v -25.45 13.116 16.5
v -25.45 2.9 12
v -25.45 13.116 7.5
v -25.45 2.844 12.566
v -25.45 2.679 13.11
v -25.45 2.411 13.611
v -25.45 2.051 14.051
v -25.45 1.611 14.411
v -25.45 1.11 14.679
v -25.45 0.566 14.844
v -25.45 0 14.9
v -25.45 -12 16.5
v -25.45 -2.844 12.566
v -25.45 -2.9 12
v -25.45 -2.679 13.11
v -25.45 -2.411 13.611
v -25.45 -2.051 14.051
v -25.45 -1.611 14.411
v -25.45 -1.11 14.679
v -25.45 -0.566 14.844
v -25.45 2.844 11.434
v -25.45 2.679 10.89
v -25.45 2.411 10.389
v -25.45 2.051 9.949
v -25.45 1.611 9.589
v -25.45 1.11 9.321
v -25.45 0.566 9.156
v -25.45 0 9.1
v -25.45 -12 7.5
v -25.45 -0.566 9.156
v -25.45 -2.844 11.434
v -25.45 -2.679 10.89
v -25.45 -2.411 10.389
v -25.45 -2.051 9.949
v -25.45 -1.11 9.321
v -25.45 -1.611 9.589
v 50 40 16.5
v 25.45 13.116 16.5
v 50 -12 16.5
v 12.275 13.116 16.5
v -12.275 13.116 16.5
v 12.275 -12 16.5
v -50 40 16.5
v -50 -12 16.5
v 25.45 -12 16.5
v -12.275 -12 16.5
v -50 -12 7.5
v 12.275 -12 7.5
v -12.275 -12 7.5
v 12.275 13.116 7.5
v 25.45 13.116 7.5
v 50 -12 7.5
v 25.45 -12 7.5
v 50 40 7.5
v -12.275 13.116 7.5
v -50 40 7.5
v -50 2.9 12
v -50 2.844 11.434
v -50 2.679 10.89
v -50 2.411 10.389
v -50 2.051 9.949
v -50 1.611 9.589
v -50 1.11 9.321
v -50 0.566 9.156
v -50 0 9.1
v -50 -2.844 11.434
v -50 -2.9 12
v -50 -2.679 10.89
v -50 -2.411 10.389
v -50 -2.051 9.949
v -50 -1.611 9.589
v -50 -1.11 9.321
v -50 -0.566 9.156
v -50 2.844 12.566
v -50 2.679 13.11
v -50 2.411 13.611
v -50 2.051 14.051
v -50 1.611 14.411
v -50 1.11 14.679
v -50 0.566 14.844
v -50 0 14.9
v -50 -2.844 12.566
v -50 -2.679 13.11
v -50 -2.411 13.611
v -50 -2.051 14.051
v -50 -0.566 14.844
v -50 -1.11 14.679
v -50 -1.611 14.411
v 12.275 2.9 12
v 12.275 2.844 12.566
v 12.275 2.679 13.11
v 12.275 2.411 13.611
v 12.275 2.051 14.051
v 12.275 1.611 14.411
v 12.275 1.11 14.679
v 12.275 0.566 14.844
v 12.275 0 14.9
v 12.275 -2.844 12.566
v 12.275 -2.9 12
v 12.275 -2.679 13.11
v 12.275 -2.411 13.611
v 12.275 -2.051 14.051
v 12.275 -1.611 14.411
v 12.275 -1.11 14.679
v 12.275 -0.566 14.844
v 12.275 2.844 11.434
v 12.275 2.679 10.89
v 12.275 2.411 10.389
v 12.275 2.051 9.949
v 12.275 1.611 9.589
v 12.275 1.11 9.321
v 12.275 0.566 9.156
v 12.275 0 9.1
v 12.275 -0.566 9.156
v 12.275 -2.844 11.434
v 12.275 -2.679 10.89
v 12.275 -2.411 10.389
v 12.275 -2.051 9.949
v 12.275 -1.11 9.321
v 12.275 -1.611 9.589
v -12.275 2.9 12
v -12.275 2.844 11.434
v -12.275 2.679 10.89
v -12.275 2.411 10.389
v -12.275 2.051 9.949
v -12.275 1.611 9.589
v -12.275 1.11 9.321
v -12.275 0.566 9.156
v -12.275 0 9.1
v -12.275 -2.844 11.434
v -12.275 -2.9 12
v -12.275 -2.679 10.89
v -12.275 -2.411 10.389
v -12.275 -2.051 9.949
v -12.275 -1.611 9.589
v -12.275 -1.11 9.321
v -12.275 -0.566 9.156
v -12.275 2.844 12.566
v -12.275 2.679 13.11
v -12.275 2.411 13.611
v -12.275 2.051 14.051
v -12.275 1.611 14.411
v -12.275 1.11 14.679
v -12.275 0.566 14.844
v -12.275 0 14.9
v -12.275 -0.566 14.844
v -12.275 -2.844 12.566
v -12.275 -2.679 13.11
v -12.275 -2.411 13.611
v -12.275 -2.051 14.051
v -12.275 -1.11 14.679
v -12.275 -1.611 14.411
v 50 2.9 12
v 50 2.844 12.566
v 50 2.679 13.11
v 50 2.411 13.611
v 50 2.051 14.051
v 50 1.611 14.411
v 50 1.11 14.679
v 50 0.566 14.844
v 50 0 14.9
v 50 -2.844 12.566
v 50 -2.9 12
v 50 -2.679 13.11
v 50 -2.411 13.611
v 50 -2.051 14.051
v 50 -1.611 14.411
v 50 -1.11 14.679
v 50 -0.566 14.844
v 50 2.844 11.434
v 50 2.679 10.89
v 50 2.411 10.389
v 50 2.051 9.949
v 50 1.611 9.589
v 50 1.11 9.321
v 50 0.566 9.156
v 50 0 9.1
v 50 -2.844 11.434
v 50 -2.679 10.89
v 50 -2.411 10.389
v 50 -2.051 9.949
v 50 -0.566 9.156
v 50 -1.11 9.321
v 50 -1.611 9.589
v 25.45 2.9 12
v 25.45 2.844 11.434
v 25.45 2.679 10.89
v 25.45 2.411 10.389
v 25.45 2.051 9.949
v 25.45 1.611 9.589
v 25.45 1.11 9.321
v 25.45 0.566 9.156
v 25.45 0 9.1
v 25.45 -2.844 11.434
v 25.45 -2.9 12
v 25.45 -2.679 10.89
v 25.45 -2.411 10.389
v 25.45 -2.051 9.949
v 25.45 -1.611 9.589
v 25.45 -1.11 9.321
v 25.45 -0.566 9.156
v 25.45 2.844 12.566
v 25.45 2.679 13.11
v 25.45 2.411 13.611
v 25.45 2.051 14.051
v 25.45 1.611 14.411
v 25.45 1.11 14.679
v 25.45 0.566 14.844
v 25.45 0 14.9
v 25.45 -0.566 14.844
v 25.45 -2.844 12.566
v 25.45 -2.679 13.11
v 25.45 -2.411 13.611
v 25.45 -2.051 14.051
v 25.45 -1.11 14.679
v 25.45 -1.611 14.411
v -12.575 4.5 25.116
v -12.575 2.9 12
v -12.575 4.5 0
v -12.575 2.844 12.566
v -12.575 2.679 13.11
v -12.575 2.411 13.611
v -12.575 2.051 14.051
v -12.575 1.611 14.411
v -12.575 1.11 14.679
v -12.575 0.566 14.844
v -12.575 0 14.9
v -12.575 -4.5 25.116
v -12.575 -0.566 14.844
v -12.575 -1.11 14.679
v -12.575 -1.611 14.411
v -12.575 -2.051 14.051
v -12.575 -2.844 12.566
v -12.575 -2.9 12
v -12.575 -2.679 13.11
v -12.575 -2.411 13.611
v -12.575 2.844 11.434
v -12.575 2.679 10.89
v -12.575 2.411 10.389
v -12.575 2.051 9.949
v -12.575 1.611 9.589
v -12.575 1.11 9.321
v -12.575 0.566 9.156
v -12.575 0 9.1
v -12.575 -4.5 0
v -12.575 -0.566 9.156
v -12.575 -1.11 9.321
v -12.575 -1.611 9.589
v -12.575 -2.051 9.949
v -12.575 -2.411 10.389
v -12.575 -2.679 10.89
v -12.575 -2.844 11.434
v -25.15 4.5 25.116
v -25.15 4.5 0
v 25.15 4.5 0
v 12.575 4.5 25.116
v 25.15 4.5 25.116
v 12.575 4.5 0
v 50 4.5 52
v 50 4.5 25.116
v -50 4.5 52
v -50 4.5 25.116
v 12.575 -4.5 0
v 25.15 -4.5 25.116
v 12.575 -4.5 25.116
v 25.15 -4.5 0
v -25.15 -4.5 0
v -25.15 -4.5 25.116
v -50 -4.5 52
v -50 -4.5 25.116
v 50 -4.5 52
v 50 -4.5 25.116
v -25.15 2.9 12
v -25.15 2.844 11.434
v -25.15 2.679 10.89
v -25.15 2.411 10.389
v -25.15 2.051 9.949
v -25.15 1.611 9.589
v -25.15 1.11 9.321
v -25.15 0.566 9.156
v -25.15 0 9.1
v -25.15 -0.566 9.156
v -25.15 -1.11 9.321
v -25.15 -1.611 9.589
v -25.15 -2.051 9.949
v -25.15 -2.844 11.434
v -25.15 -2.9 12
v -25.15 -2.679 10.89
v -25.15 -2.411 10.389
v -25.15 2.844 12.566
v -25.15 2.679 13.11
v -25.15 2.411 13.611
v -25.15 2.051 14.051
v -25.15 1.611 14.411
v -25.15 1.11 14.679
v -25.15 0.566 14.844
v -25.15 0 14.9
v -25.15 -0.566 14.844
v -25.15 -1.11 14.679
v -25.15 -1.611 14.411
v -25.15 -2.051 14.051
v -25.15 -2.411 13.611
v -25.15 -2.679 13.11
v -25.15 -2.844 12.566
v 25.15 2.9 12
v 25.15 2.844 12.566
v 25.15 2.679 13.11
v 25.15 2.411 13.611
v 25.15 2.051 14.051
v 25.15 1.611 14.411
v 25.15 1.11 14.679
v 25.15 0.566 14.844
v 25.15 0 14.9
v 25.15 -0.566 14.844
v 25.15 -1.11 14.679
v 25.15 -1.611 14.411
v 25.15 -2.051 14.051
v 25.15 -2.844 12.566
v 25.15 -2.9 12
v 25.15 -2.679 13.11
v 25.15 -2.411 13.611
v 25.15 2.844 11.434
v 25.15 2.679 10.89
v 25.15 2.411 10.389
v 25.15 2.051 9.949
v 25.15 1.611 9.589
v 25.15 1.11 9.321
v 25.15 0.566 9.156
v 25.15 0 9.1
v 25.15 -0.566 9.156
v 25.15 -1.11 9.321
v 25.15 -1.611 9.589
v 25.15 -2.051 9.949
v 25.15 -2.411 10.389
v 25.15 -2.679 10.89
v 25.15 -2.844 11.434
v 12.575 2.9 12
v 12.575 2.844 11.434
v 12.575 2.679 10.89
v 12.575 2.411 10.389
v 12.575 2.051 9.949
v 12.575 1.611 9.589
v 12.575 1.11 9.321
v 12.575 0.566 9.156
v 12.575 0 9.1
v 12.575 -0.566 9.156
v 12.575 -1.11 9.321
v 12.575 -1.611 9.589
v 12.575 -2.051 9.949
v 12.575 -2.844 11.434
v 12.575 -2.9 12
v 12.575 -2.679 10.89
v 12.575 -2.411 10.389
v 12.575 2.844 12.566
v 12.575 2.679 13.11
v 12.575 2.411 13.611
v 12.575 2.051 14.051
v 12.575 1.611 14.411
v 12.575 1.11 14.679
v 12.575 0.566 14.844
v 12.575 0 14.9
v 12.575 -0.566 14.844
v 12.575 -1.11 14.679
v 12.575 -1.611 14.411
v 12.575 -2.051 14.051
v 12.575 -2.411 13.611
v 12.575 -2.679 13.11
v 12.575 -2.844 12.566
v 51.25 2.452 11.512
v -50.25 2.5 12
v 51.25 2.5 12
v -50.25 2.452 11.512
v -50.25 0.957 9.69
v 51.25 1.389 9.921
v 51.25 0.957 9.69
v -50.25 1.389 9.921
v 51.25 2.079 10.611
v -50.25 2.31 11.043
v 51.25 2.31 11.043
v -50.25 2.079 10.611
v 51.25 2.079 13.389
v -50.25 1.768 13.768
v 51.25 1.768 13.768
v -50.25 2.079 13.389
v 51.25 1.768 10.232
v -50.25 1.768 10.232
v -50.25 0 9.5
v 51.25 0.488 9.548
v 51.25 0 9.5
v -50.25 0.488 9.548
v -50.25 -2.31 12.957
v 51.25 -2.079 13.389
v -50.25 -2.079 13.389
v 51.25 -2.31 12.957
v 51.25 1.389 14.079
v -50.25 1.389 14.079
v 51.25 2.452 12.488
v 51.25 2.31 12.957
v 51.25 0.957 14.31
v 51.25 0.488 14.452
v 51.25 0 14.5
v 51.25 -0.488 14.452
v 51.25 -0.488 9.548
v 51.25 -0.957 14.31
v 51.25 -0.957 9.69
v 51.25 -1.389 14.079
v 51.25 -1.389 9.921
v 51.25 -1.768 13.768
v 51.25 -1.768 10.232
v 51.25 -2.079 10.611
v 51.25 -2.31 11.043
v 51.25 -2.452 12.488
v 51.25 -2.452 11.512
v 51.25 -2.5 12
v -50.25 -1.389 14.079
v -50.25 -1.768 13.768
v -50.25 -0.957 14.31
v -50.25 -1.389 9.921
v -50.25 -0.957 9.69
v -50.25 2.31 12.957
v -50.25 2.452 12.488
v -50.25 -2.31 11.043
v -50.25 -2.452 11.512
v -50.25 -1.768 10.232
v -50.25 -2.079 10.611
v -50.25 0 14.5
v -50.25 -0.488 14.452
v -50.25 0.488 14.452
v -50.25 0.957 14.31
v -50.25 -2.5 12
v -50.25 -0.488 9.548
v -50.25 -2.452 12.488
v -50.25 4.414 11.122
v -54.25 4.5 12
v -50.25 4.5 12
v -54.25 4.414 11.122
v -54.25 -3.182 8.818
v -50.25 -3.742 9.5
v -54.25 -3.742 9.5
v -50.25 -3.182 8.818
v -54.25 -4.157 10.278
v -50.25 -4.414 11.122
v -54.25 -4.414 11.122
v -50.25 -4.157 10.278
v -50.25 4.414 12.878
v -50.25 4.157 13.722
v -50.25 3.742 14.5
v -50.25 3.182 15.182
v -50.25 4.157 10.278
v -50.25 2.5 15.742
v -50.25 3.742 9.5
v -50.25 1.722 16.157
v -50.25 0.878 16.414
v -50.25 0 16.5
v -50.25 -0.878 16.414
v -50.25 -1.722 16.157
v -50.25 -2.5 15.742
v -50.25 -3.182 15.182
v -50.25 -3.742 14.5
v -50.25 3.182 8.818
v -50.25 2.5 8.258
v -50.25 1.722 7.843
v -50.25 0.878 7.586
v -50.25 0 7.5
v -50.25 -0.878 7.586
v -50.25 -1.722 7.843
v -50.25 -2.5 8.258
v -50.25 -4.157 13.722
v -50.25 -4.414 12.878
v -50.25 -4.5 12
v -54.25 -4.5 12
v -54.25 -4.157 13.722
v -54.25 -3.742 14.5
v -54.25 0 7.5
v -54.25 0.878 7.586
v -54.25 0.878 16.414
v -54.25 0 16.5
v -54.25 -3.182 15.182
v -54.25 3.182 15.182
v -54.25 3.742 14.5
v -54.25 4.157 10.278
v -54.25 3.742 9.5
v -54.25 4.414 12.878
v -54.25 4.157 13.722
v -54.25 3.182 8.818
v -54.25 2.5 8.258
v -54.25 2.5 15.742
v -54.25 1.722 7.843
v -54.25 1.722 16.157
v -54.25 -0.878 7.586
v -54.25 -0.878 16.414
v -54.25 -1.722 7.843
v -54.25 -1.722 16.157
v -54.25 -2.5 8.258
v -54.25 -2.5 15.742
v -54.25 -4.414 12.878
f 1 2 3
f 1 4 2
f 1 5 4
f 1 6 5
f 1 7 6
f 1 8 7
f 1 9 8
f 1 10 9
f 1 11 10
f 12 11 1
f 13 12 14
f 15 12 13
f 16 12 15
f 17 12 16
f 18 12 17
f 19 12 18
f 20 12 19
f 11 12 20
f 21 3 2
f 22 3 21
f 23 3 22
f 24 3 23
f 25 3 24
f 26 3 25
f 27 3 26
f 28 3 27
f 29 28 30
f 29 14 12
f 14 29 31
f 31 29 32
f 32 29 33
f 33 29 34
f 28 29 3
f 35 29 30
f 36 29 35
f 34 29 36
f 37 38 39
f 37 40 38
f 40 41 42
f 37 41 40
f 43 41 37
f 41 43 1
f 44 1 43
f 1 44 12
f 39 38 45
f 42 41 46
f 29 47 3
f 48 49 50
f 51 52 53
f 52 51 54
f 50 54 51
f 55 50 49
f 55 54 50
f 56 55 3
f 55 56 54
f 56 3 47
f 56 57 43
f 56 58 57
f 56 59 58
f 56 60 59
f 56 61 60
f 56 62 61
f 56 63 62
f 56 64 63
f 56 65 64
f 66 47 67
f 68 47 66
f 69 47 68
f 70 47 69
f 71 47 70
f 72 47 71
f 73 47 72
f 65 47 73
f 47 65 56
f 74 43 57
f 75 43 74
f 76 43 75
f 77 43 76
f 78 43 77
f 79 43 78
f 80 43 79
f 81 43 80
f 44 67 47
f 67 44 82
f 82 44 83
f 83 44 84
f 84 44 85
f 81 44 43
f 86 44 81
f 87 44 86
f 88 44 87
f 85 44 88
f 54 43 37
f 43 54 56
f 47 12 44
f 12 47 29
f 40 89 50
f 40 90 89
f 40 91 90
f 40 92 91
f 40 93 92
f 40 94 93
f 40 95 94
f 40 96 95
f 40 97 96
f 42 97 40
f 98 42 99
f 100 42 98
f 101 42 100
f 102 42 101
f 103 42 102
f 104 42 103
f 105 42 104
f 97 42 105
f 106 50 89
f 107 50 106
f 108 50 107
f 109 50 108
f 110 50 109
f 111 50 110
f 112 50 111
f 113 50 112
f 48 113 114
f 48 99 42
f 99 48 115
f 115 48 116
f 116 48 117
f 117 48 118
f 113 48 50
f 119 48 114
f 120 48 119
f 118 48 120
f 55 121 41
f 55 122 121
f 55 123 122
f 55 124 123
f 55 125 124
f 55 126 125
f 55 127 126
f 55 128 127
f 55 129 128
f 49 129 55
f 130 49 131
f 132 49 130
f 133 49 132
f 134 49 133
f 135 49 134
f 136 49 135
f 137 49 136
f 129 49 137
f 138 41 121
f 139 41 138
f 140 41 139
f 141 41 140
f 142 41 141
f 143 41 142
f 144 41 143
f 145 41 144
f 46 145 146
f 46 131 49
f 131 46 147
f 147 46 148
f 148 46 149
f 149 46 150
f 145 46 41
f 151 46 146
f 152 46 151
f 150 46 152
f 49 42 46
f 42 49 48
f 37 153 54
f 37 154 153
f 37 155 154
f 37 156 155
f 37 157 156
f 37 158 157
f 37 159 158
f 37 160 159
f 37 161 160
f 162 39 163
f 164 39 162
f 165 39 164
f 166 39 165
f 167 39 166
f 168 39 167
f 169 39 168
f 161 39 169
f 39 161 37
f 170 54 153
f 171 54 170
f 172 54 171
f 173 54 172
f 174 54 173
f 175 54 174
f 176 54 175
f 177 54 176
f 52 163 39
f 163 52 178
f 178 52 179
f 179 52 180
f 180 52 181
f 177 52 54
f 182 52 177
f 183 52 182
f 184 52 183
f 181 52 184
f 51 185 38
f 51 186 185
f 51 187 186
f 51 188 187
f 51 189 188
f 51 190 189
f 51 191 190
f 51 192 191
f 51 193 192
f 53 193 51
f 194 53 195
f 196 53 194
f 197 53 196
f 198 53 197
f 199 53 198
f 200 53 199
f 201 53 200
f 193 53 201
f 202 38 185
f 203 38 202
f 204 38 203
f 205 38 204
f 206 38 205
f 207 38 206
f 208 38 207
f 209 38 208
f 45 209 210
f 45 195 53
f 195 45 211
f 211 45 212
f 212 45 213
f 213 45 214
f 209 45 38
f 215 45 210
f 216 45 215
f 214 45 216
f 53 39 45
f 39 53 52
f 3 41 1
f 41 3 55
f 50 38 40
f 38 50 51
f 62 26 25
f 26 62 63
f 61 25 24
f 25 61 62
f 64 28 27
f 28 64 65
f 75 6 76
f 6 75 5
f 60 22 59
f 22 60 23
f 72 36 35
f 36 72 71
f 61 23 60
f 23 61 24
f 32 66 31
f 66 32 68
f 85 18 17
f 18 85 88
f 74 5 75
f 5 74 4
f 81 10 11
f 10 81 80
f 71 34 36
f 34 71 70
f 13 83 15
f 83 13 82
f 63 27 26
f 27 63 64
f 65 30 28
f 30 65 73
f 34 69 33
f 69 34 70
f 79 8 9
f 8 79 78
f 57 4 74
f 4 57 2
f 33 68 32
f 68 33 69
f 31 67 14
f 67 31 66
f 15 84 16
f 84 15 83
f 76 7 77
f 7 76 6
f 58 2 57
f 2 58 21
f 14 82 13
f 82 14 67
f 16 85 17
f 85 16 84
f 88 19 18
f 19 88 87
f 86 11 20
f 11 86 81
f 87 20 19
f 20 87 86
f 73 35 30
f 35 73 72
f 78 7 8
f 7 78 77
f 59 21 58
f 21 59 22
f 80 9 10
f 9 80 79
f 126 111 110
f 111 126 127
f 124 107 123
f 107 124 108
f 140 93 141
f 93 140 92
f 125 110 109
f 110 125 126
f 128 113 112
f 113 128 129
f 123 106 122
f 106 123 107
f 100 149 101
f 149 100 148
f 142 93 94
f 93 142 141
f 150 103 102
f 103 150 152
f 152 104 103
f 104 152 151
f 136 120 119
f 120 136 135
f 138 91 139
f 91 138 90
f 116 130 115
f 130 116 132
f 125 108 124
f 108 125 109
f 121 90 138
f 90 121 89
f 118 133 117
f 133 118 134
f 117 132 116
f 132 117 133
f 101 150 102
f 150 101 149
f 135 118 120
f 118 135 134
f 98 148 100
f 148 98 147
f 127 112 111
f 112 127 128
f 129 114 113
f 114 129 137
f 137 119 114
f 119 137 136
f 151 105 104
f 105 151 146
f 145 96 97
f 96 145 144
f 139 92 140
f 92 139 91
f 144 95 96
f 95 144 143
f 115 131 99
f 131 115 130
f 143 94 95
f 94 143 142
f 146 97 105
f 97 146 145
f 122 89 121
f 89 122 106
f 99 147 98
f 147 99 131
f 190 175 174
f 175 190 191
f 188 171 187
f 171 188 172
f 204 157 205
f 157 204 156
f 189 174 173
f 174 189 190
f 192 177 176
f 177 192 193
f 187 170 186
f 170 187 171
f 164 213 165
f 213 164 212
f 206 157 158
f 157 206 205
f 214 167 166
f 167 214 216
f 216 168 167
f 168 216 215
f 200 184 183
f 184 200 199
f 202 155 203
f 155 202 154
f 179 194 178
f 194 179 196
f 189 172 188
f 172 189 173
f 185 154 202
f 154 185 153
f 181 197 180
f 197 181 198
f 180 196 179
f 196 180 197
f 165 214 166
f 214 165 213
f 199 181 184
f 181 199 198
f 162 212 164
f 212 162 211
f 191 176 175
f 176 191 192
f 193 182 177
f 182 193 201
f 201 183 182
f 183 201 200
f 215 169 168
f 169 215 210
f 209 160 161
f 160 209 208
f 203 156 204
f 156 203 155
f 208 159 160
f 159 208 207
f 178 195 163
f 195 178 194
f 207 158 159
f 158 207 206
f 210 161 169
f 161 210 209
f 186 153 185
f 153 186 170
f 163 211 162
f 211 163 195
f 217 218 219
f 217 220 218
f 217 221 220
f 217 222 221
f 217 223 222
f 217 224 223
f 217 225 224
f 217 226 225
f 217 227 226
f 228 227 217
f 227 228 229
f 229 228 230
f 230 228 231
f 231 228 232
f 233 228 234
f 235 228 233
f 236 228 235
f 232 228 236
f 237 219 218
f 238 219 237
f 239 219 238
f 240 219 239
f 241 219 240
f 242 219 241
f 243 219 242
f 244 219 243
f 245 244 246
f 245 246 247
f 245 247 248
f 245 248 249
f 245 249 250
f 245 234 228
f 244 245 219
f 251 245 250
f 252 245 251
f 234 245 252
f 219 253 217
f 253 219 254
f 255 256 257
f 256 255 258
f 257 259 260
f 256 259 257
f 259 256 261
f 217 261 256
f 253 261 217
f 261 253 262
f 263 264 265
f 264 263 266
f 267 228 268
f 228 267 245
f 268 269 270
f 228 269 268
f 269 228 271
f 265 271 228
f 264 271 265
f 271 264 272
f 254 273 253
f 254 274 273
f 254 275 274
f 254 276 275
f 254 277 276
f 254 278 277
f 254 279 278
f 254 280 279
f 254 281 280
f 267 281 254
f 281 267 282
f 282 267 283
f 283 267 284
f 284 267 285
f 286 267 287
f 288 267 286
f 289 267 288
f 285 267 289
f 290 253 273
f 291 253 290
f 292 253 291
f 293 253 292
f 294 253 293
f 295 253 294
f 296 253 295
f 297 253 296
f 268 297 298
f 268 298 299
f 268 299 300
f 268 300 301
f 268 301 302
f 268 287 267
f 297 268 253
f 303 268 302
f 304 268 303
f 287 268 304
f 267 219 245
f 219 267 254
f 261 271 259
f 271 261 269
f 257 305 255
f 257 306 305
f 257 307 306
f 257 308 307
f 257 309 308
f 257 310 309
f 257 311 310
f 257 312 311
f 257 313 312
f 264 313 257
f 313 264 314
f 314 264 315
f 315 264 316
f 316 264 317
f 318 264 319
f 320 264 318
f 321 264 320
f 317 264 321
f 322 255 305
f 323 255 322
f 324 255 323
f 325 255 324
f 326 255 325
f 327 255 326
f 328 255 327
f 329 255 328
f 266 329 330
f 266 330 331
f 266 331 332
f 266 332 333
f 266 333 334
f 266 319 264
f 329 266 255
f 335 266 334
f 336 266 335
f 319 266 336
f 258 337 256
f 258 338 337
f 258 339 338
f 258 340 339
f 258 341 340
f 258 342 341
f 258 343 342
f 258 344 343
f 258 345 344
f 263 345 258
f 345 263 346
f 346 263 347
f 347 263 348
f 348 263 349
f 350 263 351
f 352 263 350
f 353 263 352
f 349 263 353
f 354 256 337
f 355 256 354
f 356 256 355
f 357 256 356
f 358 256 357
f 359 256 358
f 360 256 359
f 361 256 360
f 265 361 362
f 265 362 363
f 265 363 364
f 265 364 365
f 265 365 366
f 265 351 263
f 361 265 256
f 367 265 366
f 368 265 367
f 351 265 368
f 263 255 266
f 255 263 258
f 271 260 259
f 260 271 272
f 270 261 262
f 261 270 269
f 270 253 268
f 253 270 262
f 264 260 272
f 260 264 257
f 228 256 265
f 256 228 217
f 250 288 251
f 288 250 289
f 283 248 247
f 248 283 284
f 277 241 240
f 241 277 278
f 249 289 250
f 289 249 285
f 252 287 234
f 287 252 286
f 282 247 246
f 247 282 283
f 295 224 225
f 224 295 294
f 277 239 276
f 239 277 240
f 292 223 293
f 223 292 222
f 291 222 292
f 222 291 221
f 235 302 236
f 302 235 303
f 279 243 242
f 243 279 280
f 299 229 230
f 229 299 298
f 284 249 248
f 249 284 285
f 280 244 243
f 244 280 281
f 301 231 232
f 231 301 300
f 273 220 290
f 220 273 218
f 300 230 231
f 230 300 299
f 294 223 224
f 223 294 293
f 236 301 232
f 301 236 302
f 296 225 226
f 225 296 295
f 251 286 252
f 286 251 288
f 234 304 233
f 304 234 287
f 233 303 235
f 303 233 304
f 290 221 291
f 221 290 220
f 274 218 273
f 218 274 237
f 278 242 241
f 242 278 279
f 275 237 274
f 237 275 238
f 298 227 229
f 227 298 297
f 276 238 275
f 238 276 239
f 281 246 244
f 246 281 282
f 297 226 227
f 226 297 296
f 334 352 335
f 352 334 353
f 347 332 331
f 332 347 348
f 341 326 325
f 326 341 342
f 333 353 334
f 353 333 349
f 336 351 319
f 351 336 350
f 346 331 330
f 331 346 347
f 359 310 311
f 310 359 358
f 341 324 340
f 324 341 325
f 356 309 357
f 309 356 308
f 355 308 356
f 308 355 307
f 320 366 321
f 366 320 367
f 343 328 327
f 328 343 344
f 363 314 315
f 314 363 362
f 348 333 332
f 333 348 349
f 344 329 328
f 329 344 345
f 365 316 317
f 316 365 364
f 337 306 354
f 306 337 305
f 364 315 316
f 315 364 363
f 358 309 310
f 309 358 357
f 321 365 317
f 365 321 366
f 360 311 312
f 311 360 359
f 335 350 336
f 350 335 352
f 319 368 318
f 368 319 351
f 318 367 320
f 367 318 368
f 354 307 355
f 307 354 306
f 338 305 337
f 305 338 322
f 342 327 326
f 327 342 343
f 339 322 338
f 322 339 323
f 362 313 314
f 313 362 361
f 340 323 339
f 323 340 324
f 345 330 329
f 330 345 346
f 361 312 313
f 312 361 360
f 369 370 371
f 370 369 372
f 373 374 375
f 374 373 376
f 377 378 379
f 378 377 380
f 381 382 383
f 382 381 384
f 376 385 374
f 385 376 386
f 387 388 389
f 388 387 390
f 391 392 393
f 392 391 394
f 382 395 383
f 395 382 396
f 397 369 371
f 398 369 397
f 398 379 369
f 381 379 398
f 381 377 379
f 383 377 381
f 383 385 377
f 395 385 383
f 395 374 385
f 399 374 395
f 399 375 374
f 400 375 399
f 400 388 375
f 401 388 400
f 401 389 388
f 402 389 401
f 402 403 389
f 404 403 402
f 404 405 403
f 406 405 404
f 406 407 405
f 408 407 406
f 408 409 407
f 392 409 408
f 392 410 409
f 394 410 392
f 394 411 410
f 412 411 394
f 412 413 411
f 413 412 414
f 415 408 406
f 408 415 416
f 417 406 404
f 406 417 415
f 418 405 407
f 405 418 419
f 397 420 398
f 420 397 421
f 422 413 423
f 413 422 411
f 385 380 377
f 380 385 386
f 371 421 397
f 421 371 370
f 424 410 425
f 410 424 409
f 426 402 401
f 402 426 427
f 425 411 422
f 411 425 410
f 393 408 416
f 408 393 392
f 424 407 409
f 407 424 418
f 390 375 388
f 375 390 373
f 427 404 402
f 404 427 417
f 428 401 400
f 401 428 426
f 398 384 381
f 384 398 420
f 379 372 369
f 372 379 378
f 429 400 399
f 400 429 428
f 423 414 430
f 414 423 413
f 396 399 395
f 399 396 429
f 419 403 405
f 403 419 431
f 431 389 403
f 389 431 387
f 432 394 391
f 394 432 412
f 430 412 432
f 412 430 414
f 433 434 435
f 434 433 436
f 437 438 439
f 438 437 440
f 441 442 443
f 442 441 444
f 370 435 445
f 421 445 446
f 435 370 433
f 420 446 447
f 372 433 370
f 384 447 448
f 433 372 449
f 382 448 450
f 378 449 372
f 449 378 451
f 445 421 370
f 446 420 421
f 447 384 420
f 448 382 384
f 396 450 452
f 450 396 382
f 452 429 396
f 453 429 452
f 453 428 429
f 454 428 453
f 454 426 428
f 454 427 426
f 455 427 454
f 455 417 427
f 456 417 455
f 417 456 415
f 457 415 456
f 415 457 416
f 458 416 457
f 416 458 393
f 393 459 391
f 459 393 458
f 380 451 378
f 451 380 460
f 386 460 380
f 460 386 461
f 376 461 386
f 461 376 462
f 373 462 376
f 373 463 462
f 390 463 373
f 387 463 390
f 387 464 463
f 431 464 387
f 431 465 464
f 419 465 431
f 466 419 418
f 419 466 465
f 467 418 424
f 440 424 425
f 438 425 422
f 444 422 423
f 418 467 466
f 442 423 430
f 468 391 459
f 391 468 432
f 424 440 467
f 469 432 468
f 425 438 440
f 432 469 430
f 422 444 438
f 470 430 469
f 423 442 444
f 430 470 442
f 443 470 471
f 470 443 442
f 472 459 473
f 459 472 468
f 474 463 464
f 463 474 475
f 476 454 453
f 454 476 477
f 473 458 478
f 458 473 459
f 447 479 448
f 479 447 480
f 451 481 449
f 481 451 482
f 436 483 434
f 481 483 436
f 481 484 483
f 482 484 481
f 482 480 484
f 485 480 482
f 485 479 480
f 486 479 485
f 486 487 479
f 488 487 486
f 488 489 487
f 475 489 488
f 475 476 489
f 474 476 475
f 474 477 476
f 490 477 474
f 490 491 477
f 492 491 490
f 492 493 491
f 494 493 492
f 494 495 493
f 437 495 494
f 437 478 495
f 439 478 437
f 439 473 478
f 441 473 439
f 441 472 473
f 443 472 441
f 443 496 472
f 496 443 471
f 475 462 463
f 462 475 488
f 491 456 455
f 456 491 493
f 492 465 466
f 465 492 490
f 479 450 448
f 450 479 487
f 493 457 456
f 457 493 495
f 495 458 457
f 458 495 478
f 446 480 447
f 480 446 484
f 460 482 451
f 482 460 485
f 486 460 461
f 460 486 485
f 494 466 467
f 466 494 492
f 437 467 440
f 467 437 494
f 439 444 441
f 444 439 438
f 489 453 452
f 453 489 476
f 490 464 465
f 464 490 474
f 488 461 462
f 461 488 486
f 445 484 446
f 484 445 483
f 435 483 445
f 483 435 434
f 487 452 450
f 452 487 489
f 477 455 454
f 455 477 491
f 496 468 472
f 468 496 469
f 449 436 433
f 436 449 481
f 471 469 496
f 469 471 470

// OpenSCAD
$fn = 32;

// ------------------------------------------------------------------------
// Butt hinge: hinge 100 mm, leaf swung 270 deg
// Every part is its own module, assembly() places every instance.
// ------------------------------------------------------------------------

// --- part 1 ---
module hinge_base() {
  difference() {
    union() {
      translate([-50, -12, -4.5]) cube([24.55, 52, 9]);
      translate([-12.275, -12, -4.5]) cube([24.55, 52, 9]);
      translate([25.45, -12, -4.5]) cube([24.55, 52, 9]);
      translate([-50, 13.116, -4.5]) cube([100, 26.884, 9]);
    }
    translate([-37.725, 0, 0]) rotate([0, 90, 0]) cylinder(h = 26.55, d = 5.8, center = true);
    translate([0, 0, 0]) rotate([0, 90, 0]) cylinder(h = 26.55, d = 5.8, center = true);
    translate([37.725, 0, 0]) rotate([0, 90, 0]) cylinder(h = 26.55, d = 5.8, center = true);
  }
}

// --- part 2 ---
module hinge_mover() {
  difference() {
    union() {
      translate([-25.15, -40, -4.5]) cube([12.575, 52, 9]);
      translate([12.575, -40, -4.5]) cube([12.575, 52, 9]);
      translate([-50, -40, -4.5]) cube([100, 26.884, 9]);
    }
    translate([-18.863, 0, 0]) rotate([0, 90, 0]) cylinder(h = 14.575, d = 5.8, center = true);
    translate([18.863, 0, 0]) rotate([0, 90, 0]) cylinder(h = 14.575, d = 5.8, center = true);
  }
}

// --- part 3 ---
module hinge_pin() {
  rotate([0, 90, 0]) cylinder(h = 102.5, d = 5, center = true);
  translate([-54.25, 0, 0]) rotate([0, 90, 0]) cylinder(h = 4, d = 9);
}

// --- assembly ---
module assembly() {
  color([0.80, 0.24, 0.20]) translate([0, 0, 12]) rotate([0, 0, 0]) hinge_base();
  color([0.20, 0.45, 0.75]) translate([0, 0, 12]) rotate([270, 0, 0]) hinge_mover();
  color([0.25, 0.62, 0.32]) translate([0, 0, 12]) rotate([0, 0, 0]) hinge_pin();
}

assembly();
